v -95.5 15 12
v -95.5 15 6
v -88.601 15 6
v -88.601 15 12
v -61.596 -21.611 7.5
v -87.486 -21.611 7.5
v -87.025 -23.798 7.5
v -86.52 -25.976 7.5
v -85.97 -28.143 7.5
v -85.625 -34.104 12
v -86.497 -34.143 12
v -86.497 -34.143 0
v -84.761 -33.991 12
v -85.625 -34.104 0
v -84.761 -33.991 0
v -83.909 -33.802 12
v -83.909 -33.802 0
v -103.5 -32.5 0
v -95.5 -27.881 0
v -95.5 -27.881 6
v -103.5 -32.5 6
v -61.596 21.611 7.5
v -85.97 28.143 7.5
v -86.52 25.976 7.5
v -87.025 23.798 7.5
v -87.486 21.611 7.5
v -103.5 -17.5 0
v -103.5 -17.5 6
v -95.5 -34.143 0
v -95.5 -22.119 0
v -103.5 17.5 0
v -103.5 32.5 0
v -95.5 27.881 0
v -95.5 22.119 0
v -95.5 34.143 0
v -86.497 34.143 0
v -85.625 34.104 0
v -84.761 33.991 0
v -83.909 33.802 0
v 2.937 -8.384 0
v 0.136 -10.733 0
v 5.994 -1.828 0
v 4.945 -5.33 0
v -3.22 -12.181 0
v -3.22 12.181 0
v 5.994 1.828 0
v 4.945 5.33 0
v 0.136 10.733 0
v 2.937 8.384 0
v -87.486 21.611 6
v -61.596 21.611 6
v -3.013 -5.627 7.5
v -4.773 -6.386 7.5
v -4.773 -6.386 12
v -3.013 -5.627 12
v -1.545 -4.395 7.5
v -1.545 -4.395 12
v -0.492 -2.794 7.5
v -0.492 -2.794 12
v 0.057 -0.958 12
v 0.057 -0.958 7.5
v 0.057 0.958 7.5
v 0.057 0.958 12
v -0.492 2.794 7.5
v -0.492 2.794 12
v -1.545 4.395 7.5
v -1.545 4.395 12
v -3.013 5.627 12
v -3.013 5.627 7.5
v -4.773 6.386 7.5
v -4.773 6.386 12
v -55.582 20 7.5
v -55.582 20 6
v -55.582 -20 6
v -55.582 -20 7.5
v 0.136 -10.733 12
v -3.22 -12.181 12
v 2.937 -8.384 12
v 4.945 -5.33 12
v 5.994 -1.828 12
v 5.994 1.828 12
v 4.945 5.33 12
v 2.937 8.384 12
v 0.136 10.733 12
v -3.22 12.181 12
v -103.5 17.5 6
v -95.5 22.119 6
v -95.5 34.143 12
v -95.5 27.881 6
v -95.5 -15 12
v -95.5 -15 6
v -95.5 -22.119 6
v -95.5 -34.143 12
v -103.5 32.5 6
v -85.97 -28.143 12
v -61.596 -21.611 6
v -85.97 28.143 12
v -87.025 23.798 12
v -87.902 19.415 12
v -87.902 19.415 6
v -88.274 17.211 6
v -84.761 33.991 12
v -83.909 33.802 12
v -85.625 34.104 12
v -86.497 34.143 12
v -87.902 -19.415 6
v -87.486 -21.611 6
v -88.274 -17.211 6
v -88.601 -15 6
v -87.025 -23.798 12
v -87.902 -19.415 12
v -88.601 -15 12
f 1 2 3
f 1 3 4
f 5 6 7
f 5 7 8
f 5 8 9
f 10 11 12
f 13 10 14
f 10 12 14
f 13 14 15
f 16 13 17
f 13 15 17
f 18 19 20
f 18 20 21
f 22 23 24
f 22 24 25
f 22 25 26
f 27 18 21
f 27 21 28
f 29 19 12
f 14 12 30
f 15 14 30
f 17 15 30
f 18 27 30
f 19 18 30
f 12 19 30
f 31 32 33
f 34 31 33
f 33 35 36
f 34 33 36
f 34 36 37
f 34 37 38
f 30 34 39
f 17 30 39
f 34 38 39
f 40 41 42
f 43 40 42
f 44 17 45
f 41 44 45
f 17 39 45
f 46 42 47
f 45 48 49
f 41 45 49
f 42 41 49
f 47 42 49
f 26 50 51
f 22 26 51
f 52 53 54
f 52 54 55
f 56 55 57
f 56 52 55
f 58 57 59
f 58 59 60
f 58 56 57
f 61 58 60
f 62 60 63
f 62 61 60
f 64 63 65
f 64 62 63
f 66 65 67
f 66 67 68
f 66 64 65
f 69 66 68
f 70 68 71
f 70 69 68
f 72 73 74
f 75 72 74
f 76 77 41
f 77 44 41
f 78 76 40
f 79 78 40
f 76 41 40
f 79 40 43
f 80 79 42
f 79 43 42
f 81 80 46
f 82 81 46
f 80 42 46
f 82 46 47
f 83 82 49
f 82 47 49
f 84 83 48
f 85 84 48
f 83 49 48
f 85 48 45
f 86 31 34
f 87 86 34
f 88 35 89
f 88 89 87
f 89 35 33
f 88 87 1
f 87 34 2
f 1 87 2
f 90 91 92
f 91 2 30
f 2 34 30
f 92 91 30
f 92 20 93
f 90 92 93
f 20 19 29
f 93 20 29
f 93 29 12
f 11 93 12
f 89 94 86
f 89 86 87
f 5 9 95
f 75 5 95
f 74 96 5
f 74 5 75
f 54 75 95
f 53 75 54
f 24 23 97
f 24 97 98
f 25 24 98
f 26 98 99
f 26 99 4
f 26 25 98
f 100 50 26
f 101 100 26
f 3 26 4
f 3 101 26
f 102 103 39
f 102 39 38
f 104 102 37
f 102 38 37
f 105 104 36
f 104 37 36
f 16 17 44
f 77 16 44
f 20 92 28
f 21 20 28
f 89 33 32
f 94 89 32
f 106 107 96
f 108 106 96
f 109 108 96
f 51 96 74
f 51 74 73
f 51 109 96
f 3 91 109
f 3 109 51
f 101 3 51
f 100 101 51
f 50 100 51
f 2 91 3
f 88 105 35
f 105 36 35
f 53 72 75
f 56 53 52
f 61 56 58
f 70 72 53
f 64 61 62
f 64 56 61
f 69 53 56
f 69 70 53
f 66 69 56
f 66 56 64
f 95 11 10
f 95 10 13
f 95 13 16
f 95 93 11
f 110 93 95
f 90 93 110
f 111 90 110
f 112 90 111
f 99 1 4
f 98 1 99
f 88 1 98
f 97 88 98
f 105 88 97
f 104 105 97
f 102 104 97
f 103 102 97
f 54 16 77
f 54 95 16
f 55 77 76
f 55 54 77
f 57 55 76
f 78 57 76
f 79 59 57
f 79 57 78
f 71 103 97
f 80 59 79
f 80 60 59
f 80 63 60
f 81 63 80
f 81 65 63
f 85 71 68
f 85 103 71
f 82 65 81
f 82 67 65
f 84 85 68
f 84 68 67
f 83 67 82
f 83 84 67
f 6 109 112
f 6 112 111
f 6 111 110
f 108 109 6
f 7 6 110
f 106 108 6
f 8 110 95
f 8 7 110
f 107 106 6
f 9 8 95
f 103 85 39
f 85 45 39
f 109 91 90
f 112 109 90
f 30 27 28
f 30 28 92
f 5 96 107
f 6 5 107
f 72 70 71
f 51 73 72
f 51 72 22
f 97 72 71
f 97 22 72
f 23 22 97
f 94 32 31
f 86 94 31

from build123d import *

# Parameters (mm, degrees)
BOSS_EXTRUDE1_DEPTH = 6
BOSS_EXTRUDE2_START = 6
BOSS_EXTRUDE2_DEPTH = 6
BOSS_EXTRUDE3_DEPTH = 6
SKETCH3_W           = 6
SKETCH3_H           = 30
CUT_EXTRUDE1_DEPTH  = 10
BOSS_EXTRUDE4_DEPTH = 1.5


with BuildPart() as part:
    # Sketch1 → Boss-Extrude1 (new body)
    # profile 1 of 2: a face of its own
    with BuildSketch(Plane.XY):
        with BuildLine():
            Line((-95.5, -34.142511157), (-86.497052813, -34.142511157))
            ThreePointArc((-86.497052813, -34.142511157), (-85.191790891, -34.05695977), (-83.908862362, -33.80176942))
            Line((-83.908862362, -33.80176942), (-3.220006135, -12.181255556))
            ThreePointArc((-3.220006135, -12.181255556), (6.127, 0), (-3.220006135, 12.181255556))
            Line((-3.220006135, 12.181255556), (-83.908862362, 33.80176942))
            ThreePointArc((-83.908862362, 33.80176942), (-85.191790891, 34.05695977), (-86.497052813, 34.142511157))
            Line((-86.497052813, 34.142511157), (-95.5, 34.142511157))
            Line((-95.5, 34.142511157), (-95.5, -34.142511157))
        make_face()
        with BuildLine():
            ThreePointArc((-4.772920406, -6.385700598), (0.127, 0), (-4.772920406, 6.385700598))
            Line((-4.772920406, 6.385700598), (-85.970442822, 28.142511157))
            ThreePointArc((-85.970442822, 28.142511157), (-89.627, 0), (-85.970442822, -28.142511157))
            Line((-85.970442822, -28.142511157), (-4.772920406, -6.385700598))
        make_face(mode=Mode.SUBTRACT)
    # profile 2 of 2: a face of its own
    with BuildSketch(Plane.XY):
        with BuildLine():
            Line((-85.970442822, -28.142511157), (-4.772920406, -6.385700598))
            ThreePointArc((-4.772920406, -6.385700598), (0.127, 0), (-4.772920406, 6.385700598))
            Line((-4.772920406, 6.385700598), (-85.970442822, 28.142511157))
            ThreePointArc((-85.970442822, 28.142511157), (-89.627, 0), (-85.970442822, -28.142511157))
        make_face()
    extrude(amount=BOSS_EXTRUDE1_DEPTH)

    # Sketch1<3> → Boss-Extrude2 (add)
    with BuildSketch(Plane.XY.offset(BOSS_EXTRUDE2_START)):
        with BuildLine():
            Line((-83.908862362, -33.80176942), (-3.220006135, -12.181255556))
            ThreePointArc((-3.220006135, -12.181255556), (6.127, 0), (-3.220006135, 12.181255556))
            Line((-3.220006135, 12.181255556), (-83.908862362, 33.80176942))
            ThreePointArc((-83.908862362, 33.80176942), (-85.191790891, 34.05695977), (-86.497052813, 34.142511157))
            Line((-86.497052813, 34.142511157), (-95.5, 34.142511157))
            Line((-95.5, 34.142511157), (-95.5, -34.142511157))
            Line((-95.5, -34.142511157), (-86.497052813, -34.142511157))
            ThreePointArc((-86.497052813, -34.142511157), (-85.191790891, -34.05695977), (-83.908862362, -33.80176942))
        make_face()
        with BuildLine():
            Line((-85.970442822, -28.142511157), (-4.772920406, -6.385700598))
            ThreePointArc((-4.772920406, -6.385700598), (0.127, 0), (-4.772920406, 6.385700598))
            Line((-4.772920406, 6.385700598), (-85.970442822, 28.142511157))
            ThreePointArc((-85.970442822, 28.142511157), (-89.627, 0), (-85.970442822, -28.142511157))
        make_face(mode=Mode.SUBTRACT)
    extrude(amount=BOSS_EXTRUDE2_DEPTH)

    # Sketch2 → Boss-Extrude3 (add)
    with BuildSketch(Plane.XY):
        Polygon((-95.5, 27.881197846), (-103.5, 32.5), (-103.5, 17.5), (-95.5, 22.118802154), align=None)
        Polygon((-103.5, -17.5), (-95.5, -22.118802154), (-95.5, -27.881197846), (-103.5, -32.5), align=None)
    extrude(amount=BOSS_EXTRUDE3_DEPTH)

    # Sketch3 → Cut-Extrude1 (cut)
    with BuildSketch(Plane.ZY.offset(95.5)):
        with Locations((9, 0)):
            Rectangle(SKETCH3_W, SKETCH3_H)
    extrude(amount=-CUT_EXTRUDE1_DEPTH, mode=Mode.SUBTRACT)

    # Sketch4 → Boss-Extrude4 (add)
    with BuildSketch(Plane.XY.offset(6)):
        with BuildLine():
            Line((-55.582177484, 20), (-55.582177484, -20))
            Line((-55.582177484, -20), (-4.772920406, -6.385700598))
            ThreePointArc((-4.772920406, -6.385700598), (0.127, 0), (-4.772920406, 6.385700598))
            Line((-4.772920406, 6.385700598), (-55.582177484, 20))
        make_face()
        with BuildLine():
            Line((-87.485682099, 21.611307008), (-61.595657104, 21.611307008))
            Line((-61.595657104, 21.611307008), (-85.970442822, 28.142511157))
            ThreePointArc((-85.970442822, 28.142511157), (-86.777777456, 24.888442961), (-87.485682099, 21.611307008))
        make_face()
        with BuildLine():
            Line((-85.970442822, -28.142511157), (-61.595657104, -21.611307008))
            Line((-61.595657104, -21.611307008), (-87.485682099, -21.611307008))
            ThreePointArc((-87.485682099, -21.611307008), (-86.777777456, -24.888442961), (-85.970442822, -28.142511157))
        make_face()
    extrude(amount=BOSS_EXTRUDE4_DEPTH)


solid = part.part
